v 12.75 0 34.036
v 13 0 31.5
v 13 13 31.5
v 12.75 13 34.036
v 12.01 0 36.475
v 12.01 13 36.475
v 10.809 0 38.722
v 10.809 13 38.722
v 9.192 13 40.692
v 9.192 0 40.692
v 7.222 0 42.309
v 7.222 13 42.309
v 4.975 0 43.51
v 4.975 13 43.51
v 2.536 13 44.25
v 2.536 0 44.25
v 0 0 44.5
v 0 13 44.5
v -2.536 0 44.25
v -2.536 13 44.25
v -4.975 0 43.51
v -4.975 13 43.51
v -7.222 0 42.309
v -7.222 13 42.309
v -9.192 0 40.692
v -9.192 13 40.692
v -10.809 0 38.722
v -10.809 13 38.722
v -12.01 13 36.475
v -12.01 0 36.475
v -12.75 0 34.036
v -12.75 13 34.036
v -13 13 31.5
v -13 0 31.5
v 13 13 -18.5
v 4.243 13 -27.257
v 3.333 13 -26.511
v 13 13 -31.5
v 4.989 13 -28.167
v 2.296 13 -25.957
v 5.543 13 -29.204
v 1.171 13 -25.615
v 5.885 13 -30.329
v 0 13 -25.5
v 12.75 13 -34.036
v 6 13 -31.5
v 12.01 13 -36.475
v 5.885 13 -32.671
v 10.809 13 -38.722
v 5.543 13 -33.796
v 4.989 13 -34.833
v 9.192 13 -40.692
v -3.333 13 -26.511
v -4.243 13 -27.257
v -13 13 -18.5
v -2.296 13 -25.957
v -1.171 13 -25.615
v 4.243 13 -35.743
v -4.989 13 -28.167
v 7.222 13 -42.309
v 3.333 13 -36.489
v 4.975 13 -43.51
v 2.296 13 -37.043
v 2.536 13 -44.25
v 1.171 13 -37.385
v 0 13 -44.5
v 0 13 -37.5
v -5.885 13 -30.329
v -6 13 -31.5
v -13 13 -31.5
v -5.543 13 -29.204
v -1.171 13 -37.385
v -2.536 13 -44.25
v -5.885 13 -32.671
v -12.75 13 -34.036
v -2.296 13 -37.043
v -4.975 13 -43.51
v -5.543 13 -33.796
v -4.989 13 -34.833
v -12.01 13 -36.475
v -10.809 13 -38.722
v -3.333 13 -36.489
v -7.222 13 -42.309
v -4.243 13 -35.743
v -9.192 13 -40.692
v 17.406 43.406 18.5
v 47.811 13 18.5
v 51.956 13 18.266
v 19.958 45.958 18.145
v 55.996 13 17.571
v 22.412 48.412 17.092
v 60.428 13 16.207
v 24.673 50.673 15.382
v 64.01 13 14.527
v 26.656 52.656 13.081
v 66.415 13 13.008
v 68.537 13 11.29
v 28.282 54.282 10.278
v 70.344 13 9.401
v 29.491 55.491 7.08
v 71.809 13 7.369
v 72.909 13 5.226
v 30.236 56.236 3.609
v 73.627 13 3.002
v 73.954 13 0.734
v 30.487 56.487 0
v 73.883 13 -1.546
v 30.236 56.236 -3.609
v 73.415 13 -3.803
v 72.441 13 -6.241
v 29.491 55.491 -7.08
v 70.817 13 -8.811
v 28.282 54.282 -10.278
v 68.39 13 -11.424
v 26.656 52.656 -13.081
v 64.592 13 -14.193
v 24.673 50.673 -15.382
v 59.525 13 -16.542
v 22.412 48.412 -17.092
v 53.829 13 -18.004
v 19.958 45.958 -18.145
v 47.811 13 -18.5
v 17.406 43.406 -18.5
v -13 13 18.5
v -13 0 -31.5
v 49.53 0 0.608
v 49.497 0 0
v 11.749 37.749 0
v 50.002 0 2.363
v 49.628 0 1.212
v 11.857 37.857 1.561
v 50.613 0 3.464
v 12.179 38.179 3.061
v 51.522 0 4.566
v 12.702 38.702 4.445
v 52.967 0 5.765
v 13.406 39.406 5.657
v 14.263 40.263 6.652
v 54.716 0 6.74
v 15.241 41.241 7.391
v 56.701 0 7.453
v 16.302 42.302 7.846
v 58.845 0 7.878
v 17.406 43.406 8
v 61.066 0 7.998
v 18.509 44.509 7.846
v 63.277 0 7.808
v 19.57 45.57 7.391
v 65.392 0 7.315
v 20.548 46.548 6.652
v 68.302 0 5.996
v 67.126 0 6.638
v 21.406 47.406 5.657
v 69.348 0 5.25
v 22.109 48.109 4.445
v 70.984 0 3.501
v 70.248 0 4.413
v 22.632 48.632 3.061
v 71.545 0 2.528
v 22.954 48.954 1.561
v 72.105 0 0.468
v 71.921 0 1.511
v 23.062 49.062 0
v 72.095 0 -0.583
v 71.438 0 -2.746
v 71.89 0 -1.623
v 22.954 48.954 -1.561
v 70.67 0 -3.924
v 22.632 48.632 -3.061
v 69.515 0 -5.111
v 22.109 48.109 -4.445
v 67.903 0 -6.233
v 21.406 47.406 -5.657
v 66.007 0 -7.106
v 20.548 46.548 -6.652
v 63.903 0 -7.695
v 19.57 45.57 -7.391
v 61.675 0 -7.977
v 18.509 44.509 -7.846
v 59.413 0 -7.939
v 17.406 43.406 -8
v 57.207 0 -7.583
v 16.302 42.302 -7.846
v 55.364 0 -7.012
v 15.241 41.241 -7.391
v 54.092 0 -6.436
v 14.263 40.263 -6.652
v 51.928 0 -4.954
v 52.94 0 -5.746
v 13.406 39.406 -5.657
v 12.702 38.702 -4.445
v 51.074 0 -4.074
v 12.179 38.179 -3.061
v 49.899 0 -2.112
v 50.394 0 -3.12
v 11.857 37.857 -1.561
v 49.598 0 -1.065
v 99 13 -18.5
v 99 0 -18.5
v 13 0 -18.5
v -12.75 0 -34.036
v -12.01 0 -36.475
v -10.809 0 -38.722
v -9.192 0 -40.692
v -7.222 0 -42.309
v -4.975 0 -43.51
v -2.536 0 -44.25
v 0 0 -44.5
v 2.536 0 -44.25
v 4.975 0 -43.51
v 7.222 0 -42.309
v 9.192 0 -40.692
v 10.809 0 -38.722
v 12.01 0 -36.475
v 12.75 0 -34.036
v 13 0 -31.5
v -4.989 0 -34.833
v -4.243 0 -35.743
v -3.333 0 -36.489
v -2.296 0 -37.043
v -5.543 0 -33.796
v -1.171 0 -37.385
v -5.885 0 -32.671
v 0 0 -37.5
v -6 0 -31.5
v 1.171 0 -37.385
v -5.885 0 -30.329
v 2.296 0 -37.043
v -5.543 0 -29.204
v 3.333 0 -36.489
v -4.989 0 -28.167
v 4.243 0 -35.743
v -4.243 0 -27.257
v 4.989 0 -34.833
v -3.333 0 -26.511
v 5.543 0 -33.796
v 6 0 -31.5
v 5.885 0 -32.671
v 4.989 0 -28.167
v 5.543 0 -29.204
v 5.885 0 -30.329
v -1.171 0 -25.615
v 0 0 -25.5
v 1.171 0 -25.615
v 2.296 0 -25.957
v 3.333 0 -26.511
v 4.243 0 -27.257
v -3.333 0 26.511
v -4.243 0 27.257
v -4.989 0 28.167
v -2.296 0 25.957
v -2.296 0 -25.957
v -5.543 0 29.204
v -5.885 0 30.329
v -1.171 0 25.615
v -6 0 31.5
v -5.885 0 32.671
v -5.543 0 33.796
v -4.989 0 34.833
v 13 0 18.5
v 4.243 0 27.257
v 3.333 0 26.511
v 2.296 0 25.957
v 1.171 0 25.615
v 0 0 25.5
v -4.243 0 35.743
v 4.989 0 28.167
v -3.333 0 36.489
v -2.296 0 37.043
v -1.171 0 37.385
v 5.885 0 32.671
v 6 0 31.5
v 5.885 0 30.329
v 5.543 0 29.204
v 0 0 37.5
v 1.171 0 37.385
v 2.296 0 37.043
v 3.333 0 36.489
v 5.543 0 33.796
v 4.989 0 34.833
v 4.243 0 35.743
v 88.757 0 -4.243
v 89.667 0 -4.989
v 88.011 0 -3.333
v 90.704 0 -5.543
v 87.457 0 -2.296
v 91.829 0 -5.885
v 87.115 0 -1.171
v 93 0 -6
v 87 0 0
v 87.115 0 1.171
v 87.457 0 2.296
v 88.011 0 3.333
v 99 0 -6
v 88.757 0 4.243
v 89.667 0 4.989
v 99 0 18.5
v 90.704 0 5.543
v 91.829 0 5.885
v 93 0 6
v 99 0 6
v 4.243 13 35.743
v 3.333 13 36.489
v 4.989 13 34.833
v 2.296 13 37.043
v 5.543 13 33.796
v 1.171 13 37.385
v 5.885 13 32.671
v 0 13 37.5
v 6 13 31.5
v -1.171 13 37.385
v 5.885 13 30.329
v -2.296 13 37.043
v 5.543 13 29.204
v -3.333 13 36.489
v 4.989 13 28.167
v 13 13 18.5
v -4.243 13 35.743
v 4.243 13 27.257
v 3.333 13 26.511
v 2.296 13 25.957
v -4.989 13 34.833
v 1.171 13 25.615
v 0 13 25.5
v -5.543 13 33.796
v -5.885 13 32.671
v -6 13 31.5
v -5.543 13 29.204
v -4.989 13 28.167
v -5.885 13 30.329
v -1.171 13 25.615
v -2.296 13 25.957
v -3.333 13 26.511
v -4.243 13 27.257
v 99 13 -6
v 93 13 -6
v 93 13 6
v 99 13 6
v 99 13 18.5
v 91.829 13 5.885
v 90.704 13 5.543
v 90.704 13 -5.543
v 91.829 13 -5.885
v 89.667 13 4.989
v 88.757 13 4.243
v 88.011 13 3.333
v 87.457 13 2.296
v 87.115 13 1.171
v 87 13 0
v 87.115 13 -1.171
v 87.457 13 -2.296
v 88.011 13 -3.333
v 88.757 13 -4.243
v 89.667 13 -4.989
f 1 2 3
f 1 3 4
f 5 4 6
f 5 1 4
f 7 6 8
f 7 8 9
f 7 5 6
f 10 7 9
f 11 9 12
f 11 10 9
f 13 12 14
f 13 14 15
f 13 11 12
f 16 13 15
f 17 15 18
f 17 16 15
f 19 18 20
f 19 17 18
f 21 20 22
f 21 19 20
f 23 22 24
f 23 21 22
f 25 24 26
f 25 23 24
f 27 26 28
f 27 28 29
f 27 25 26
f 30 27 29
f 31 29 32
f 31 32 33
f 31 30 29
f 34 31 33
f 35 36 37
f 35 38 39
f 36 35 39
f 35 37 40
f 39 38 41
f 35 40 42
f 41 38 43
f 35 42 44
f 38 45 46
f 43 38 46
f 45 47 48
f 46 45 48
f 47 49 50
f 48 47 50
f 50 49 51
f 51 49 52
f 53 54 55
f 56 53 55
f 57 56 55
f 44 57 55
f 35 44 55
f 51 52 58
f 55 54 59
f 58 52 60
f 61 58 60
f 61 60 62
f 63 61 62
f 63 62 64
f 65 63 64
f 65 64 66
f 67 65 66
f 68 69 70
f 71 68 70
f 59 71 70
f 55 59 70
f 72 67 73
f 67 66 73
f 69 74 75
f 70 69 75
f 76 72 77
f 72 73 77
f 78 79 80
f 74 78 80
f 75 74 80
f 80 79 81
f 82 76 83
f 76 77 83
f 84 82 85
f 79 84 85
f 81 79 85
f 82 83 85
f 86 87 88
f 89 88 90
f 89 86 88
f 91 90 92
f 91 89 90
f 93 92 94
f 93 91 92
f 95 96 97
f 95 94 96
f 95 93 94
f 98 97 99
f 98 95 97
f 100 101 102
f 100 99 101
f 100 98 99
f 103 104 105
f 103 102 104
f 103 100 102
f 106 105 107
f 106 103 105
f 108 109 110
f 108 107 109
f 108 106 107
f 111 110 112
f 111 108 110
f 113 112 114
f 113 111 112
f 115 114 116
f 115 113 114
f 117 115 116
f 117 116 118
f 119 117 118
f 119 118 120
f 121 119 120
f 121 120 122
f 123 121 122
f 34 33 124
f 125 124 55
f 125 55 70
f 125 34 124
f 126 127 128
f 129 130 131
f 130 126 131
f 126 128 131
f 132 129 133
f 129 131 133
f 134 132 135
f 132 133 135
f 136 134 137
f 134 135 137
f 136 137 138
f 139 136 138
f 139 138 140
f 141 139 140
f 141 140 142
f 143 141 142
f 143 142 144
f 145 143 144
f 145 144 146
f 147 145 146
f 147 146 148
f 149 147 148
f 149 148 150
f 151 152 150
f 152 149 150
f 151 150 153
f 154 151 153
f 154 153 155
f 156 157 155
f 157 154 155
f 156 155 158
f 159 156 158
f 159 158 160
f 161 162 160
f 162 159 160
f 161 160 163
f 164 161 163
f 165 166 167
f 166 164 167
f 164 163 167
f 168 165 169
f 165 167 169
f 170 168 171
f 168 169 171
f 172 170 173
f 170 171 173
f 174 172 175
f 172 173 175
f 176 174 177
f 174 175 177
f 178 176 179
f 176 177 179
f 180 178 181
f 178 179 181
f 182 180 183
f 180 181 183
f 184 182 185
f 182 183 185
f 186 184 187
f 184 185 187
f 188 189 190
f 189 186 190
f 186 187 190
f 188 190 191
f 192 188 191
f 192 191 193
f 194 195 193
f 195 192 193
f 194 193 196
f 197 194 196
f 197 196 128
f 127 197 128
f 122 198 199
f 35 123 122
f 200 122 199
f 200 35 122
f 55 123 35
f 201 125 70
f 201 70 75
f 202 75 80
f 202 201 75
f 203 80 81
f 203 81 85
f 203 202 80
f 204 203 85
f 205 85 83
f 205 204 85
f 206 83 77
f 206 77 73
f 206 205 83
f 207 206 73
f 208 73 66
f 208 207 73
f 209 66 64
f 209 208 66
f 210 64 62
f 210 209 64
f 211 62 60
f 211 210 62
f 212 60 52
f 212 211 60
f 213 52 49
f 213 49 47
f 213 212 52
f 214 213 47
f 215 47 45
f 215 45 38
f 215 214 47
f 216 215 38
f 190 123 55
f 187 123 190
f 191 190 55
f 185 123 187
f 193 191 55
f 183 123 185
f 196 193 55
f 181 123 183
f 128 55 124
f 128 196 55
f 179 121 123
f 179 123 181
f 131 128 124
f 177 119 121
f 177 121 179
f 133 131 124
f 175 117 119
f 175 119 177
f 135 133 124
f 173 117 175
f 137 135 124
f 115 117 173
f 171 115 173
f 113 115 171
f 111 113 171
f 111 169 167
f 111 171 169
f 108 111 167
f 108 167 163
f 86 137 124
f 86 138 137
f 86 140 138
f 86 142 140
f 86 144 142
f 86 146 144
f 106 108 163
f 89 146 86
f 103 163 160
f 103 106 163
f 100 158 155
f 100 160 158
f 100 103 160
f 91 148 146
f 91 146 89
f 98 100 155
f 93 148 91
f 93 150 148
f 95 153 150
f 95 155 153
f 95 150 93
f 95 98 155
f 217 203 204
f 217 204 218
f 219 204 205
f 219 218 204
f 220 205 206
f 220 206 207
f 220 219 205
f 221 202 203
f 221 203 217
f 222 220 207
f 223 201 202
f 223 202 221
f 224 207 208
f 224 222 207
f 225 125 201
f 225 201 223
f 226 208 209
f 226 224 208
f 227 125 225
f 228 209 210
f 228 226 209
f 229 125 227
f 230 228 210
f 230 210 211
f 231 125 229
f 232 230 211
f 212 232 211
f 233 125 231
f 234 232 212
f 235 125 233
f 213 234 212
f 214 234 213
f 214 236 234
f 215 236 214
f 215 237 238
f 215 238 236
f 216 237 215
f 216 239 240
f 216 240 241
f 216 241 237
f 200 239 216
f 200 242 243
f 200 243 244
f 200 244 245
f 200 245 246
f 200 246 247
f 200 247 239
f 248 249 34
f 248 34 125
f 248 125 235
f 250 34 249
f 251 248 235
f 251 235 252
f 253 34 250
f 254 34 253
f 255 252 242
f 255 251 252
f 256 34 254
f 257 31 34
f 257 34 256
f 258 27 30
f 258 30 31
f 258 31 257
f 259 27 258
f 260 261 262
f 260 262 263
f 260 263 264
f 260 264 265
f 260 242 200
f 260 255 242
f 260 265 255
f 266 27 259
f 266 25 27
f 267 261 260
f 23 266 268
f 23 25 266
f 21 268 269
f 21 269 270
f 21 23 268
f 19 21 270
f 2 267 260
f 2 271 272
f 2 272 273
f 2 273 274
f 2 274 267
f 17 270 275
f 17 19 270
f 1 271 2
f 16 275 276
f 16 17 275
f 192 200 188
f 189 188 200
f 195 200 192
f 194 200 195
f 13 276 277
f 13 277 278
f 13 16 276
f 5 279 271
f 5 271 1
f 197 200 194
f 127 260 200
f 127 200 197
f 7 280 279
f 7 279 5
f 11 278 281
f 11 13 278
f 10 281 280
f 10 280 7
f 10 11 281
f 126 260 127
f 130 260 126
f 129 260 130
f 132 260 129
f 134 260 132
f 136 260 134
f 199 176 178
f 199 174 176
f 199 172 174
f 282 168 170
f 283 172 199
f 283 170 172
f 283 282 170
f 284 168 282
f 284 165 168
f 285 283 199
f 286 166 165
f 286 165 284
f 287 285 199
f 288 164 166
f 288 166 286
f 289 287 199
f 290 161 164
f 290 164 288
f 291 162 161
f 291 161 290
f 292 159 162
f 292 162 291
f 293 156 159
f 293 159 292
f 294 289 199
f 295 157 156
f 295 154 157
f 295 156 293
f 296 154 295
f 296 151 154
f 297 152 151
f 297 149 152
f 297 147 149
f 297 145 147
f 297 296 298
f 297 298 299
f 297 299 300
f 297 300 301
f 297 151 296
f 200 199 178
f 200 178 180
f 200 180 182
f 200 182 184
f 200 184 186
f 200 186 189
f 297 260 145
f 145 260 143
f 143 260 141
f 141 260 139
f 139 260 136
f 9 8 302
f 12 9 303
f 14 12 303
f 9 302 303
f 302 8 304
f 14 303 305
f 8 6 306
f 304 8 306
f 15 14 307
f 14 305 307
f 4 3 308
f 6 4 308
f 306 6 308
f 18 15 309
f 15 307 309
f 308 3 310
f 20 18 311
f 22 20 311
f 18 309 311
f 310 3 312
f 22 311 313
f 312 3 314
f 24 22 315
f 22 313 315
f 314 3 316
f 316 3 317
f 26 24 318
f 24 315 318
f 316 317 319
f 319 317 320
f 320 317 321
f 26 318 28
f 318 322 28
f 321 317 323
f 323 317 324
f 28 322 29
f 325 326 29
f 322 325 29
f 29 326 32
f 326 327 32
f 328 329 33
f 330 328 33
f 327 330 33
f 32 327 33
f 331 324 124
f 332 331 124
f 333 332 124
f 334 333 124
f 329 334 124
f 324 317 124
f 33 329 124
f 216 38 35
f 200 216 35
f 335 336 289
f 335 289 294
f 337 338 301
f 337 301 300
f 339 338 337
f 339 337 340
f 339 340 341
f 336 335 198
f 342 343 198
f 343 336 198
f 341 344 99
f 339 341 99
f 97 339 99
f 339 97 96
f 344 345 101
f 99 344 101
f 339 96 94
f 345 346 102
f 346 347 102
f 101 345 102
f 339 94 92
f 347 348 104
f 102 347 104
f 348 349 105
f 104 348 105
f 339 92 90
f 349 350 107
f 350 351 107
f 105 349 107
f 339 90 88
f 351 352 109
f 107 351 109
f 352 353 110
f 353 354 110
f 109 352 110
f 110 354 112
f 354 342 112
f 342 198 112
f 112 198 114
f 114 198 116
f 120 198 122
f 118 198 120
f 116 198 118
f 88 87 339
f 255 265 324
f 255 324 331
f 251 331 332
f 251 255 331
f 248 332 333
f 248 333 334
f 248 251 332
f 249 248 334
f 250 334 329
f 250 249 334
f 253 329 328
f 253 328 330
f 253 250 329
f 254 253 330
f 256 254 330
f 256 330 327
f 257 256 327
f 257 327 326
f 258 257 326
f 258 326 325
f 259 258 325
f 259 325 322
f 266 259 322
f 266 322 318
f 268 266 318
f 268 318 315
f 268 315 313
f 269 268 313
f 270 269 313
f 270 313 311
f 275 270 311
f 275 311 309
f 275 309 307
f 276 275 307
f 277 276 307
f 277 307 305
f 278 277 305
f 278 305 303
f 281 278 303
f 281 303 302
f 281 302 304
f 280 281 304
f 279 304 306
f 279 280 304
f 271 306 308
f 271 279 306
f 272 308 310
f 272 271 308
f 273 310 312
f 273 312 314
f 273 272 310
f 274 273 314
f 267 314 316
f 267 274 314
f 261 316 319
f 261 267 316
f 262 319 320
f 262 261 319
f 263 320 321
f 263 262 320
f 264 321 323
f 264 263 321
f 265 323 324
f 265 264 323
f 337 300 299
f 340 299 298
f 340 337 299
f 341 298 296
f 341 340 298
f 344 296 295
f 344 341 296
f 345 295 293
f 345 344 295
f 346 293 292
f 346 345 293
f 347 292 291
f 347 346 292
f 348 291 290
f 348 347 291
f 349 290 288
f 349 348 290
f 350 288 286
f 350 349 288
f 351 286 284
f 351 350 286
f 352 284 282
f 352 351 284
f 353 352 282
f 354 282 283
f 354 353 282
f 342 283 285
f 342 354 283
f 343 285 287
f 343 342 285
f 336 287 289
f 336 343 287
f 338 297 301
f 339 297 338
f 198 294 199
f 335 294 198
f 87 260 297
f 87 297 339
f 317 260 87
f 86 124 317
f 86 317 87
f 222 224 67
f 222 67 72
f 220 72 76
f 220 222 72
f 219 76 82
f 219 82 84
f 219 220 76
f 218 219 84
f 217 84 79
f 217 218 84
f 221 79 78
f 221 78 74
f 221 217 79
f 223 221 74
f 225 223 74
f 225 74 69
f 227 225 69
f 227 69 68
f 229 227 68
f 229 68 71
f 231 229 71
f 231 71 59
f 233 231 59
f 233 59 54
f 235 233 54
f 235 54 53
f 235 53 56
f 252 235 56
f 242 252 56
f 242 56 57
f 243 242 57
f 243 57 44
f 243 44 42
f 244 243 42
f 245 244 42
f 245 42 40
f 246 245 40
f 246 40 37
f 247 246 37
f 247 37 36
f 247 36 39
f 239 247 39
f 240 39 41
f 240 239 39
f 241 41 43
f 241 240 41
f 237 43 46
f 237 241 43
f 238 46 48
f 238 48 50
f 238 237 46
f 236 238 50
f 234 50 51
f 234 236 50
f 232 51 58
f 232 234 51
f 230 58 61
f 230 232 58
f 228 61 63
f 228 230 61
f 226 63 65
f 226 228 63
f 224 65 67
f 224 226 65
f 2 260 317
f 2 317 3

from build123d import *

# Parameters (mm, degrees)
SKETCH1_R           = 6
BOSS_EXTRUDE1_DEPTH = 13
SKETCH2_W           = 86
SKETCH2_H           = 13
BOSS_EXTRUDE2_DEPTH = 18.5
CUT_EXTRUDE1_DEPTH  = 37
SKETCH4_R           = 8
BOSS_EXTRUDE3_DEPTH = 64
SKETCH6_W           = 112
SKETCH6_H           = 33.393710728
CUT_EXTRUDE2_DEPTH  = 32
SKETCH7_R           = 8
CUT_EXTRUDE3_DEPTH  = 88


with BuildPart() as part:
    # Sketch1 → Boss-Extrude1 (new body)
    with BuildSketch(Plane(origin=(0, 0, 0), x_dir=(1, 0, 0), z_dir=(0, 1, 0))):
        with BuildLine():
            Line((13, 31.5), (13, -31.5))
            ThreePointArc((13, -31.5), (0, -44.5), (-13, -31.5))
            Line((-13, -31.5), (-13, 31.5))
            ThreePointArc((-13, 31.5), (0, 44.5), (13, 31.5))
        make_face()
        with Locations(Location((0, 31.5, 0), (0, 0, 90))):
            Circle(SKETCH1_R, mode=Mode.SUBTRACT)
        with Locations(Location((0, -31.5, 0), (0, 0, 90))):
            Circle(SKETCH1_R, mode=Mode.SUBTRACT)
    extrude(amount=BOSS_EXTRUDE1_DEPTH)

    # Sketch2 → Boss-Extrude2 (add, symmetric)
    with BuildSketch(Plane.XY):
        with Locations((56, 6.5)):
            Rectangle(SKETCH2_W, SKETCH2_H)
    extrude(amount=BOSS_EXTRUDE2_DEPTH, both=True)

    # Sketch3 → Cut-Extrude1 (cut)
    with BuildSketch(Plane(origin=(0, 13, 0), x_dir=(1, 0, 0), z_dir=(0, 1, 0))):
        with BuildLine():
            Line((105, -6), (93, -6))
            ThreePointArc((93, -6), (87, 0), (93, 6))
            Line((93, 6), (105, 6))
            ThreePointArc((105, 6), (111, 0), (105, -6))
        make_face()
    extrude(amount=-CUT_EXTRUDE1_DEPTH, mode=Mode.SUBTRACT)

    # Sketch4 → Boss-Extrude3 (add)
    with BuildSketch(Plane(origin=(-13, 13, 0), x_dir=(0, 0, 1), z_dir=(-0.7071067811865488, 0.7071067811865464, 0))):
        with BuildLine():
            Line((-18.5, 43), (-18.5, 0))
            Line((-18.5, 0), (18.5, 0))
            Line((18.5, 0), (18.5, 43))
            ThreePointArc((18.5, 43), (0, 61.5), (-18.5, 43))
        make_face()
        with Locations(Location((0, 43, 0), (0, 0, 270))):
            Circle(SKETCH4_R, mode=Mode.SUBTRACT)
    extrude(amount=-BOSS_EXTRUDE3_DEPTH)

    # Sketch6 → Cut-Extrude2 (cut, symmetric)
    with BuildSketch(Plane.XY):
        with Locations((43, -16.696855364)):
            Rectangle(SKETCH6_W, SKETCH6_H)
    extrude(amount=CUT_EXTRUDE2_DEPTH, both=True, mode=Mode.SUBTRACT)

    # Sketch7 → Cut-Extrude3 (cut)
    with BuildSketch(Plane(origin=(-13, 13, 0), x_dir=(0, 0, 1), z_dir=(-0.7071067811865487, 0.7071067811865465, 0))):
        with Locations(Location((0, 43, 0), (0, 0, 270))):
            Circle(SKETCH7_R)
    extrude(amount=-CUT_EXTRUDE3_DEPTH, mode=Mode.SUBTRACT)


solid = part.part
